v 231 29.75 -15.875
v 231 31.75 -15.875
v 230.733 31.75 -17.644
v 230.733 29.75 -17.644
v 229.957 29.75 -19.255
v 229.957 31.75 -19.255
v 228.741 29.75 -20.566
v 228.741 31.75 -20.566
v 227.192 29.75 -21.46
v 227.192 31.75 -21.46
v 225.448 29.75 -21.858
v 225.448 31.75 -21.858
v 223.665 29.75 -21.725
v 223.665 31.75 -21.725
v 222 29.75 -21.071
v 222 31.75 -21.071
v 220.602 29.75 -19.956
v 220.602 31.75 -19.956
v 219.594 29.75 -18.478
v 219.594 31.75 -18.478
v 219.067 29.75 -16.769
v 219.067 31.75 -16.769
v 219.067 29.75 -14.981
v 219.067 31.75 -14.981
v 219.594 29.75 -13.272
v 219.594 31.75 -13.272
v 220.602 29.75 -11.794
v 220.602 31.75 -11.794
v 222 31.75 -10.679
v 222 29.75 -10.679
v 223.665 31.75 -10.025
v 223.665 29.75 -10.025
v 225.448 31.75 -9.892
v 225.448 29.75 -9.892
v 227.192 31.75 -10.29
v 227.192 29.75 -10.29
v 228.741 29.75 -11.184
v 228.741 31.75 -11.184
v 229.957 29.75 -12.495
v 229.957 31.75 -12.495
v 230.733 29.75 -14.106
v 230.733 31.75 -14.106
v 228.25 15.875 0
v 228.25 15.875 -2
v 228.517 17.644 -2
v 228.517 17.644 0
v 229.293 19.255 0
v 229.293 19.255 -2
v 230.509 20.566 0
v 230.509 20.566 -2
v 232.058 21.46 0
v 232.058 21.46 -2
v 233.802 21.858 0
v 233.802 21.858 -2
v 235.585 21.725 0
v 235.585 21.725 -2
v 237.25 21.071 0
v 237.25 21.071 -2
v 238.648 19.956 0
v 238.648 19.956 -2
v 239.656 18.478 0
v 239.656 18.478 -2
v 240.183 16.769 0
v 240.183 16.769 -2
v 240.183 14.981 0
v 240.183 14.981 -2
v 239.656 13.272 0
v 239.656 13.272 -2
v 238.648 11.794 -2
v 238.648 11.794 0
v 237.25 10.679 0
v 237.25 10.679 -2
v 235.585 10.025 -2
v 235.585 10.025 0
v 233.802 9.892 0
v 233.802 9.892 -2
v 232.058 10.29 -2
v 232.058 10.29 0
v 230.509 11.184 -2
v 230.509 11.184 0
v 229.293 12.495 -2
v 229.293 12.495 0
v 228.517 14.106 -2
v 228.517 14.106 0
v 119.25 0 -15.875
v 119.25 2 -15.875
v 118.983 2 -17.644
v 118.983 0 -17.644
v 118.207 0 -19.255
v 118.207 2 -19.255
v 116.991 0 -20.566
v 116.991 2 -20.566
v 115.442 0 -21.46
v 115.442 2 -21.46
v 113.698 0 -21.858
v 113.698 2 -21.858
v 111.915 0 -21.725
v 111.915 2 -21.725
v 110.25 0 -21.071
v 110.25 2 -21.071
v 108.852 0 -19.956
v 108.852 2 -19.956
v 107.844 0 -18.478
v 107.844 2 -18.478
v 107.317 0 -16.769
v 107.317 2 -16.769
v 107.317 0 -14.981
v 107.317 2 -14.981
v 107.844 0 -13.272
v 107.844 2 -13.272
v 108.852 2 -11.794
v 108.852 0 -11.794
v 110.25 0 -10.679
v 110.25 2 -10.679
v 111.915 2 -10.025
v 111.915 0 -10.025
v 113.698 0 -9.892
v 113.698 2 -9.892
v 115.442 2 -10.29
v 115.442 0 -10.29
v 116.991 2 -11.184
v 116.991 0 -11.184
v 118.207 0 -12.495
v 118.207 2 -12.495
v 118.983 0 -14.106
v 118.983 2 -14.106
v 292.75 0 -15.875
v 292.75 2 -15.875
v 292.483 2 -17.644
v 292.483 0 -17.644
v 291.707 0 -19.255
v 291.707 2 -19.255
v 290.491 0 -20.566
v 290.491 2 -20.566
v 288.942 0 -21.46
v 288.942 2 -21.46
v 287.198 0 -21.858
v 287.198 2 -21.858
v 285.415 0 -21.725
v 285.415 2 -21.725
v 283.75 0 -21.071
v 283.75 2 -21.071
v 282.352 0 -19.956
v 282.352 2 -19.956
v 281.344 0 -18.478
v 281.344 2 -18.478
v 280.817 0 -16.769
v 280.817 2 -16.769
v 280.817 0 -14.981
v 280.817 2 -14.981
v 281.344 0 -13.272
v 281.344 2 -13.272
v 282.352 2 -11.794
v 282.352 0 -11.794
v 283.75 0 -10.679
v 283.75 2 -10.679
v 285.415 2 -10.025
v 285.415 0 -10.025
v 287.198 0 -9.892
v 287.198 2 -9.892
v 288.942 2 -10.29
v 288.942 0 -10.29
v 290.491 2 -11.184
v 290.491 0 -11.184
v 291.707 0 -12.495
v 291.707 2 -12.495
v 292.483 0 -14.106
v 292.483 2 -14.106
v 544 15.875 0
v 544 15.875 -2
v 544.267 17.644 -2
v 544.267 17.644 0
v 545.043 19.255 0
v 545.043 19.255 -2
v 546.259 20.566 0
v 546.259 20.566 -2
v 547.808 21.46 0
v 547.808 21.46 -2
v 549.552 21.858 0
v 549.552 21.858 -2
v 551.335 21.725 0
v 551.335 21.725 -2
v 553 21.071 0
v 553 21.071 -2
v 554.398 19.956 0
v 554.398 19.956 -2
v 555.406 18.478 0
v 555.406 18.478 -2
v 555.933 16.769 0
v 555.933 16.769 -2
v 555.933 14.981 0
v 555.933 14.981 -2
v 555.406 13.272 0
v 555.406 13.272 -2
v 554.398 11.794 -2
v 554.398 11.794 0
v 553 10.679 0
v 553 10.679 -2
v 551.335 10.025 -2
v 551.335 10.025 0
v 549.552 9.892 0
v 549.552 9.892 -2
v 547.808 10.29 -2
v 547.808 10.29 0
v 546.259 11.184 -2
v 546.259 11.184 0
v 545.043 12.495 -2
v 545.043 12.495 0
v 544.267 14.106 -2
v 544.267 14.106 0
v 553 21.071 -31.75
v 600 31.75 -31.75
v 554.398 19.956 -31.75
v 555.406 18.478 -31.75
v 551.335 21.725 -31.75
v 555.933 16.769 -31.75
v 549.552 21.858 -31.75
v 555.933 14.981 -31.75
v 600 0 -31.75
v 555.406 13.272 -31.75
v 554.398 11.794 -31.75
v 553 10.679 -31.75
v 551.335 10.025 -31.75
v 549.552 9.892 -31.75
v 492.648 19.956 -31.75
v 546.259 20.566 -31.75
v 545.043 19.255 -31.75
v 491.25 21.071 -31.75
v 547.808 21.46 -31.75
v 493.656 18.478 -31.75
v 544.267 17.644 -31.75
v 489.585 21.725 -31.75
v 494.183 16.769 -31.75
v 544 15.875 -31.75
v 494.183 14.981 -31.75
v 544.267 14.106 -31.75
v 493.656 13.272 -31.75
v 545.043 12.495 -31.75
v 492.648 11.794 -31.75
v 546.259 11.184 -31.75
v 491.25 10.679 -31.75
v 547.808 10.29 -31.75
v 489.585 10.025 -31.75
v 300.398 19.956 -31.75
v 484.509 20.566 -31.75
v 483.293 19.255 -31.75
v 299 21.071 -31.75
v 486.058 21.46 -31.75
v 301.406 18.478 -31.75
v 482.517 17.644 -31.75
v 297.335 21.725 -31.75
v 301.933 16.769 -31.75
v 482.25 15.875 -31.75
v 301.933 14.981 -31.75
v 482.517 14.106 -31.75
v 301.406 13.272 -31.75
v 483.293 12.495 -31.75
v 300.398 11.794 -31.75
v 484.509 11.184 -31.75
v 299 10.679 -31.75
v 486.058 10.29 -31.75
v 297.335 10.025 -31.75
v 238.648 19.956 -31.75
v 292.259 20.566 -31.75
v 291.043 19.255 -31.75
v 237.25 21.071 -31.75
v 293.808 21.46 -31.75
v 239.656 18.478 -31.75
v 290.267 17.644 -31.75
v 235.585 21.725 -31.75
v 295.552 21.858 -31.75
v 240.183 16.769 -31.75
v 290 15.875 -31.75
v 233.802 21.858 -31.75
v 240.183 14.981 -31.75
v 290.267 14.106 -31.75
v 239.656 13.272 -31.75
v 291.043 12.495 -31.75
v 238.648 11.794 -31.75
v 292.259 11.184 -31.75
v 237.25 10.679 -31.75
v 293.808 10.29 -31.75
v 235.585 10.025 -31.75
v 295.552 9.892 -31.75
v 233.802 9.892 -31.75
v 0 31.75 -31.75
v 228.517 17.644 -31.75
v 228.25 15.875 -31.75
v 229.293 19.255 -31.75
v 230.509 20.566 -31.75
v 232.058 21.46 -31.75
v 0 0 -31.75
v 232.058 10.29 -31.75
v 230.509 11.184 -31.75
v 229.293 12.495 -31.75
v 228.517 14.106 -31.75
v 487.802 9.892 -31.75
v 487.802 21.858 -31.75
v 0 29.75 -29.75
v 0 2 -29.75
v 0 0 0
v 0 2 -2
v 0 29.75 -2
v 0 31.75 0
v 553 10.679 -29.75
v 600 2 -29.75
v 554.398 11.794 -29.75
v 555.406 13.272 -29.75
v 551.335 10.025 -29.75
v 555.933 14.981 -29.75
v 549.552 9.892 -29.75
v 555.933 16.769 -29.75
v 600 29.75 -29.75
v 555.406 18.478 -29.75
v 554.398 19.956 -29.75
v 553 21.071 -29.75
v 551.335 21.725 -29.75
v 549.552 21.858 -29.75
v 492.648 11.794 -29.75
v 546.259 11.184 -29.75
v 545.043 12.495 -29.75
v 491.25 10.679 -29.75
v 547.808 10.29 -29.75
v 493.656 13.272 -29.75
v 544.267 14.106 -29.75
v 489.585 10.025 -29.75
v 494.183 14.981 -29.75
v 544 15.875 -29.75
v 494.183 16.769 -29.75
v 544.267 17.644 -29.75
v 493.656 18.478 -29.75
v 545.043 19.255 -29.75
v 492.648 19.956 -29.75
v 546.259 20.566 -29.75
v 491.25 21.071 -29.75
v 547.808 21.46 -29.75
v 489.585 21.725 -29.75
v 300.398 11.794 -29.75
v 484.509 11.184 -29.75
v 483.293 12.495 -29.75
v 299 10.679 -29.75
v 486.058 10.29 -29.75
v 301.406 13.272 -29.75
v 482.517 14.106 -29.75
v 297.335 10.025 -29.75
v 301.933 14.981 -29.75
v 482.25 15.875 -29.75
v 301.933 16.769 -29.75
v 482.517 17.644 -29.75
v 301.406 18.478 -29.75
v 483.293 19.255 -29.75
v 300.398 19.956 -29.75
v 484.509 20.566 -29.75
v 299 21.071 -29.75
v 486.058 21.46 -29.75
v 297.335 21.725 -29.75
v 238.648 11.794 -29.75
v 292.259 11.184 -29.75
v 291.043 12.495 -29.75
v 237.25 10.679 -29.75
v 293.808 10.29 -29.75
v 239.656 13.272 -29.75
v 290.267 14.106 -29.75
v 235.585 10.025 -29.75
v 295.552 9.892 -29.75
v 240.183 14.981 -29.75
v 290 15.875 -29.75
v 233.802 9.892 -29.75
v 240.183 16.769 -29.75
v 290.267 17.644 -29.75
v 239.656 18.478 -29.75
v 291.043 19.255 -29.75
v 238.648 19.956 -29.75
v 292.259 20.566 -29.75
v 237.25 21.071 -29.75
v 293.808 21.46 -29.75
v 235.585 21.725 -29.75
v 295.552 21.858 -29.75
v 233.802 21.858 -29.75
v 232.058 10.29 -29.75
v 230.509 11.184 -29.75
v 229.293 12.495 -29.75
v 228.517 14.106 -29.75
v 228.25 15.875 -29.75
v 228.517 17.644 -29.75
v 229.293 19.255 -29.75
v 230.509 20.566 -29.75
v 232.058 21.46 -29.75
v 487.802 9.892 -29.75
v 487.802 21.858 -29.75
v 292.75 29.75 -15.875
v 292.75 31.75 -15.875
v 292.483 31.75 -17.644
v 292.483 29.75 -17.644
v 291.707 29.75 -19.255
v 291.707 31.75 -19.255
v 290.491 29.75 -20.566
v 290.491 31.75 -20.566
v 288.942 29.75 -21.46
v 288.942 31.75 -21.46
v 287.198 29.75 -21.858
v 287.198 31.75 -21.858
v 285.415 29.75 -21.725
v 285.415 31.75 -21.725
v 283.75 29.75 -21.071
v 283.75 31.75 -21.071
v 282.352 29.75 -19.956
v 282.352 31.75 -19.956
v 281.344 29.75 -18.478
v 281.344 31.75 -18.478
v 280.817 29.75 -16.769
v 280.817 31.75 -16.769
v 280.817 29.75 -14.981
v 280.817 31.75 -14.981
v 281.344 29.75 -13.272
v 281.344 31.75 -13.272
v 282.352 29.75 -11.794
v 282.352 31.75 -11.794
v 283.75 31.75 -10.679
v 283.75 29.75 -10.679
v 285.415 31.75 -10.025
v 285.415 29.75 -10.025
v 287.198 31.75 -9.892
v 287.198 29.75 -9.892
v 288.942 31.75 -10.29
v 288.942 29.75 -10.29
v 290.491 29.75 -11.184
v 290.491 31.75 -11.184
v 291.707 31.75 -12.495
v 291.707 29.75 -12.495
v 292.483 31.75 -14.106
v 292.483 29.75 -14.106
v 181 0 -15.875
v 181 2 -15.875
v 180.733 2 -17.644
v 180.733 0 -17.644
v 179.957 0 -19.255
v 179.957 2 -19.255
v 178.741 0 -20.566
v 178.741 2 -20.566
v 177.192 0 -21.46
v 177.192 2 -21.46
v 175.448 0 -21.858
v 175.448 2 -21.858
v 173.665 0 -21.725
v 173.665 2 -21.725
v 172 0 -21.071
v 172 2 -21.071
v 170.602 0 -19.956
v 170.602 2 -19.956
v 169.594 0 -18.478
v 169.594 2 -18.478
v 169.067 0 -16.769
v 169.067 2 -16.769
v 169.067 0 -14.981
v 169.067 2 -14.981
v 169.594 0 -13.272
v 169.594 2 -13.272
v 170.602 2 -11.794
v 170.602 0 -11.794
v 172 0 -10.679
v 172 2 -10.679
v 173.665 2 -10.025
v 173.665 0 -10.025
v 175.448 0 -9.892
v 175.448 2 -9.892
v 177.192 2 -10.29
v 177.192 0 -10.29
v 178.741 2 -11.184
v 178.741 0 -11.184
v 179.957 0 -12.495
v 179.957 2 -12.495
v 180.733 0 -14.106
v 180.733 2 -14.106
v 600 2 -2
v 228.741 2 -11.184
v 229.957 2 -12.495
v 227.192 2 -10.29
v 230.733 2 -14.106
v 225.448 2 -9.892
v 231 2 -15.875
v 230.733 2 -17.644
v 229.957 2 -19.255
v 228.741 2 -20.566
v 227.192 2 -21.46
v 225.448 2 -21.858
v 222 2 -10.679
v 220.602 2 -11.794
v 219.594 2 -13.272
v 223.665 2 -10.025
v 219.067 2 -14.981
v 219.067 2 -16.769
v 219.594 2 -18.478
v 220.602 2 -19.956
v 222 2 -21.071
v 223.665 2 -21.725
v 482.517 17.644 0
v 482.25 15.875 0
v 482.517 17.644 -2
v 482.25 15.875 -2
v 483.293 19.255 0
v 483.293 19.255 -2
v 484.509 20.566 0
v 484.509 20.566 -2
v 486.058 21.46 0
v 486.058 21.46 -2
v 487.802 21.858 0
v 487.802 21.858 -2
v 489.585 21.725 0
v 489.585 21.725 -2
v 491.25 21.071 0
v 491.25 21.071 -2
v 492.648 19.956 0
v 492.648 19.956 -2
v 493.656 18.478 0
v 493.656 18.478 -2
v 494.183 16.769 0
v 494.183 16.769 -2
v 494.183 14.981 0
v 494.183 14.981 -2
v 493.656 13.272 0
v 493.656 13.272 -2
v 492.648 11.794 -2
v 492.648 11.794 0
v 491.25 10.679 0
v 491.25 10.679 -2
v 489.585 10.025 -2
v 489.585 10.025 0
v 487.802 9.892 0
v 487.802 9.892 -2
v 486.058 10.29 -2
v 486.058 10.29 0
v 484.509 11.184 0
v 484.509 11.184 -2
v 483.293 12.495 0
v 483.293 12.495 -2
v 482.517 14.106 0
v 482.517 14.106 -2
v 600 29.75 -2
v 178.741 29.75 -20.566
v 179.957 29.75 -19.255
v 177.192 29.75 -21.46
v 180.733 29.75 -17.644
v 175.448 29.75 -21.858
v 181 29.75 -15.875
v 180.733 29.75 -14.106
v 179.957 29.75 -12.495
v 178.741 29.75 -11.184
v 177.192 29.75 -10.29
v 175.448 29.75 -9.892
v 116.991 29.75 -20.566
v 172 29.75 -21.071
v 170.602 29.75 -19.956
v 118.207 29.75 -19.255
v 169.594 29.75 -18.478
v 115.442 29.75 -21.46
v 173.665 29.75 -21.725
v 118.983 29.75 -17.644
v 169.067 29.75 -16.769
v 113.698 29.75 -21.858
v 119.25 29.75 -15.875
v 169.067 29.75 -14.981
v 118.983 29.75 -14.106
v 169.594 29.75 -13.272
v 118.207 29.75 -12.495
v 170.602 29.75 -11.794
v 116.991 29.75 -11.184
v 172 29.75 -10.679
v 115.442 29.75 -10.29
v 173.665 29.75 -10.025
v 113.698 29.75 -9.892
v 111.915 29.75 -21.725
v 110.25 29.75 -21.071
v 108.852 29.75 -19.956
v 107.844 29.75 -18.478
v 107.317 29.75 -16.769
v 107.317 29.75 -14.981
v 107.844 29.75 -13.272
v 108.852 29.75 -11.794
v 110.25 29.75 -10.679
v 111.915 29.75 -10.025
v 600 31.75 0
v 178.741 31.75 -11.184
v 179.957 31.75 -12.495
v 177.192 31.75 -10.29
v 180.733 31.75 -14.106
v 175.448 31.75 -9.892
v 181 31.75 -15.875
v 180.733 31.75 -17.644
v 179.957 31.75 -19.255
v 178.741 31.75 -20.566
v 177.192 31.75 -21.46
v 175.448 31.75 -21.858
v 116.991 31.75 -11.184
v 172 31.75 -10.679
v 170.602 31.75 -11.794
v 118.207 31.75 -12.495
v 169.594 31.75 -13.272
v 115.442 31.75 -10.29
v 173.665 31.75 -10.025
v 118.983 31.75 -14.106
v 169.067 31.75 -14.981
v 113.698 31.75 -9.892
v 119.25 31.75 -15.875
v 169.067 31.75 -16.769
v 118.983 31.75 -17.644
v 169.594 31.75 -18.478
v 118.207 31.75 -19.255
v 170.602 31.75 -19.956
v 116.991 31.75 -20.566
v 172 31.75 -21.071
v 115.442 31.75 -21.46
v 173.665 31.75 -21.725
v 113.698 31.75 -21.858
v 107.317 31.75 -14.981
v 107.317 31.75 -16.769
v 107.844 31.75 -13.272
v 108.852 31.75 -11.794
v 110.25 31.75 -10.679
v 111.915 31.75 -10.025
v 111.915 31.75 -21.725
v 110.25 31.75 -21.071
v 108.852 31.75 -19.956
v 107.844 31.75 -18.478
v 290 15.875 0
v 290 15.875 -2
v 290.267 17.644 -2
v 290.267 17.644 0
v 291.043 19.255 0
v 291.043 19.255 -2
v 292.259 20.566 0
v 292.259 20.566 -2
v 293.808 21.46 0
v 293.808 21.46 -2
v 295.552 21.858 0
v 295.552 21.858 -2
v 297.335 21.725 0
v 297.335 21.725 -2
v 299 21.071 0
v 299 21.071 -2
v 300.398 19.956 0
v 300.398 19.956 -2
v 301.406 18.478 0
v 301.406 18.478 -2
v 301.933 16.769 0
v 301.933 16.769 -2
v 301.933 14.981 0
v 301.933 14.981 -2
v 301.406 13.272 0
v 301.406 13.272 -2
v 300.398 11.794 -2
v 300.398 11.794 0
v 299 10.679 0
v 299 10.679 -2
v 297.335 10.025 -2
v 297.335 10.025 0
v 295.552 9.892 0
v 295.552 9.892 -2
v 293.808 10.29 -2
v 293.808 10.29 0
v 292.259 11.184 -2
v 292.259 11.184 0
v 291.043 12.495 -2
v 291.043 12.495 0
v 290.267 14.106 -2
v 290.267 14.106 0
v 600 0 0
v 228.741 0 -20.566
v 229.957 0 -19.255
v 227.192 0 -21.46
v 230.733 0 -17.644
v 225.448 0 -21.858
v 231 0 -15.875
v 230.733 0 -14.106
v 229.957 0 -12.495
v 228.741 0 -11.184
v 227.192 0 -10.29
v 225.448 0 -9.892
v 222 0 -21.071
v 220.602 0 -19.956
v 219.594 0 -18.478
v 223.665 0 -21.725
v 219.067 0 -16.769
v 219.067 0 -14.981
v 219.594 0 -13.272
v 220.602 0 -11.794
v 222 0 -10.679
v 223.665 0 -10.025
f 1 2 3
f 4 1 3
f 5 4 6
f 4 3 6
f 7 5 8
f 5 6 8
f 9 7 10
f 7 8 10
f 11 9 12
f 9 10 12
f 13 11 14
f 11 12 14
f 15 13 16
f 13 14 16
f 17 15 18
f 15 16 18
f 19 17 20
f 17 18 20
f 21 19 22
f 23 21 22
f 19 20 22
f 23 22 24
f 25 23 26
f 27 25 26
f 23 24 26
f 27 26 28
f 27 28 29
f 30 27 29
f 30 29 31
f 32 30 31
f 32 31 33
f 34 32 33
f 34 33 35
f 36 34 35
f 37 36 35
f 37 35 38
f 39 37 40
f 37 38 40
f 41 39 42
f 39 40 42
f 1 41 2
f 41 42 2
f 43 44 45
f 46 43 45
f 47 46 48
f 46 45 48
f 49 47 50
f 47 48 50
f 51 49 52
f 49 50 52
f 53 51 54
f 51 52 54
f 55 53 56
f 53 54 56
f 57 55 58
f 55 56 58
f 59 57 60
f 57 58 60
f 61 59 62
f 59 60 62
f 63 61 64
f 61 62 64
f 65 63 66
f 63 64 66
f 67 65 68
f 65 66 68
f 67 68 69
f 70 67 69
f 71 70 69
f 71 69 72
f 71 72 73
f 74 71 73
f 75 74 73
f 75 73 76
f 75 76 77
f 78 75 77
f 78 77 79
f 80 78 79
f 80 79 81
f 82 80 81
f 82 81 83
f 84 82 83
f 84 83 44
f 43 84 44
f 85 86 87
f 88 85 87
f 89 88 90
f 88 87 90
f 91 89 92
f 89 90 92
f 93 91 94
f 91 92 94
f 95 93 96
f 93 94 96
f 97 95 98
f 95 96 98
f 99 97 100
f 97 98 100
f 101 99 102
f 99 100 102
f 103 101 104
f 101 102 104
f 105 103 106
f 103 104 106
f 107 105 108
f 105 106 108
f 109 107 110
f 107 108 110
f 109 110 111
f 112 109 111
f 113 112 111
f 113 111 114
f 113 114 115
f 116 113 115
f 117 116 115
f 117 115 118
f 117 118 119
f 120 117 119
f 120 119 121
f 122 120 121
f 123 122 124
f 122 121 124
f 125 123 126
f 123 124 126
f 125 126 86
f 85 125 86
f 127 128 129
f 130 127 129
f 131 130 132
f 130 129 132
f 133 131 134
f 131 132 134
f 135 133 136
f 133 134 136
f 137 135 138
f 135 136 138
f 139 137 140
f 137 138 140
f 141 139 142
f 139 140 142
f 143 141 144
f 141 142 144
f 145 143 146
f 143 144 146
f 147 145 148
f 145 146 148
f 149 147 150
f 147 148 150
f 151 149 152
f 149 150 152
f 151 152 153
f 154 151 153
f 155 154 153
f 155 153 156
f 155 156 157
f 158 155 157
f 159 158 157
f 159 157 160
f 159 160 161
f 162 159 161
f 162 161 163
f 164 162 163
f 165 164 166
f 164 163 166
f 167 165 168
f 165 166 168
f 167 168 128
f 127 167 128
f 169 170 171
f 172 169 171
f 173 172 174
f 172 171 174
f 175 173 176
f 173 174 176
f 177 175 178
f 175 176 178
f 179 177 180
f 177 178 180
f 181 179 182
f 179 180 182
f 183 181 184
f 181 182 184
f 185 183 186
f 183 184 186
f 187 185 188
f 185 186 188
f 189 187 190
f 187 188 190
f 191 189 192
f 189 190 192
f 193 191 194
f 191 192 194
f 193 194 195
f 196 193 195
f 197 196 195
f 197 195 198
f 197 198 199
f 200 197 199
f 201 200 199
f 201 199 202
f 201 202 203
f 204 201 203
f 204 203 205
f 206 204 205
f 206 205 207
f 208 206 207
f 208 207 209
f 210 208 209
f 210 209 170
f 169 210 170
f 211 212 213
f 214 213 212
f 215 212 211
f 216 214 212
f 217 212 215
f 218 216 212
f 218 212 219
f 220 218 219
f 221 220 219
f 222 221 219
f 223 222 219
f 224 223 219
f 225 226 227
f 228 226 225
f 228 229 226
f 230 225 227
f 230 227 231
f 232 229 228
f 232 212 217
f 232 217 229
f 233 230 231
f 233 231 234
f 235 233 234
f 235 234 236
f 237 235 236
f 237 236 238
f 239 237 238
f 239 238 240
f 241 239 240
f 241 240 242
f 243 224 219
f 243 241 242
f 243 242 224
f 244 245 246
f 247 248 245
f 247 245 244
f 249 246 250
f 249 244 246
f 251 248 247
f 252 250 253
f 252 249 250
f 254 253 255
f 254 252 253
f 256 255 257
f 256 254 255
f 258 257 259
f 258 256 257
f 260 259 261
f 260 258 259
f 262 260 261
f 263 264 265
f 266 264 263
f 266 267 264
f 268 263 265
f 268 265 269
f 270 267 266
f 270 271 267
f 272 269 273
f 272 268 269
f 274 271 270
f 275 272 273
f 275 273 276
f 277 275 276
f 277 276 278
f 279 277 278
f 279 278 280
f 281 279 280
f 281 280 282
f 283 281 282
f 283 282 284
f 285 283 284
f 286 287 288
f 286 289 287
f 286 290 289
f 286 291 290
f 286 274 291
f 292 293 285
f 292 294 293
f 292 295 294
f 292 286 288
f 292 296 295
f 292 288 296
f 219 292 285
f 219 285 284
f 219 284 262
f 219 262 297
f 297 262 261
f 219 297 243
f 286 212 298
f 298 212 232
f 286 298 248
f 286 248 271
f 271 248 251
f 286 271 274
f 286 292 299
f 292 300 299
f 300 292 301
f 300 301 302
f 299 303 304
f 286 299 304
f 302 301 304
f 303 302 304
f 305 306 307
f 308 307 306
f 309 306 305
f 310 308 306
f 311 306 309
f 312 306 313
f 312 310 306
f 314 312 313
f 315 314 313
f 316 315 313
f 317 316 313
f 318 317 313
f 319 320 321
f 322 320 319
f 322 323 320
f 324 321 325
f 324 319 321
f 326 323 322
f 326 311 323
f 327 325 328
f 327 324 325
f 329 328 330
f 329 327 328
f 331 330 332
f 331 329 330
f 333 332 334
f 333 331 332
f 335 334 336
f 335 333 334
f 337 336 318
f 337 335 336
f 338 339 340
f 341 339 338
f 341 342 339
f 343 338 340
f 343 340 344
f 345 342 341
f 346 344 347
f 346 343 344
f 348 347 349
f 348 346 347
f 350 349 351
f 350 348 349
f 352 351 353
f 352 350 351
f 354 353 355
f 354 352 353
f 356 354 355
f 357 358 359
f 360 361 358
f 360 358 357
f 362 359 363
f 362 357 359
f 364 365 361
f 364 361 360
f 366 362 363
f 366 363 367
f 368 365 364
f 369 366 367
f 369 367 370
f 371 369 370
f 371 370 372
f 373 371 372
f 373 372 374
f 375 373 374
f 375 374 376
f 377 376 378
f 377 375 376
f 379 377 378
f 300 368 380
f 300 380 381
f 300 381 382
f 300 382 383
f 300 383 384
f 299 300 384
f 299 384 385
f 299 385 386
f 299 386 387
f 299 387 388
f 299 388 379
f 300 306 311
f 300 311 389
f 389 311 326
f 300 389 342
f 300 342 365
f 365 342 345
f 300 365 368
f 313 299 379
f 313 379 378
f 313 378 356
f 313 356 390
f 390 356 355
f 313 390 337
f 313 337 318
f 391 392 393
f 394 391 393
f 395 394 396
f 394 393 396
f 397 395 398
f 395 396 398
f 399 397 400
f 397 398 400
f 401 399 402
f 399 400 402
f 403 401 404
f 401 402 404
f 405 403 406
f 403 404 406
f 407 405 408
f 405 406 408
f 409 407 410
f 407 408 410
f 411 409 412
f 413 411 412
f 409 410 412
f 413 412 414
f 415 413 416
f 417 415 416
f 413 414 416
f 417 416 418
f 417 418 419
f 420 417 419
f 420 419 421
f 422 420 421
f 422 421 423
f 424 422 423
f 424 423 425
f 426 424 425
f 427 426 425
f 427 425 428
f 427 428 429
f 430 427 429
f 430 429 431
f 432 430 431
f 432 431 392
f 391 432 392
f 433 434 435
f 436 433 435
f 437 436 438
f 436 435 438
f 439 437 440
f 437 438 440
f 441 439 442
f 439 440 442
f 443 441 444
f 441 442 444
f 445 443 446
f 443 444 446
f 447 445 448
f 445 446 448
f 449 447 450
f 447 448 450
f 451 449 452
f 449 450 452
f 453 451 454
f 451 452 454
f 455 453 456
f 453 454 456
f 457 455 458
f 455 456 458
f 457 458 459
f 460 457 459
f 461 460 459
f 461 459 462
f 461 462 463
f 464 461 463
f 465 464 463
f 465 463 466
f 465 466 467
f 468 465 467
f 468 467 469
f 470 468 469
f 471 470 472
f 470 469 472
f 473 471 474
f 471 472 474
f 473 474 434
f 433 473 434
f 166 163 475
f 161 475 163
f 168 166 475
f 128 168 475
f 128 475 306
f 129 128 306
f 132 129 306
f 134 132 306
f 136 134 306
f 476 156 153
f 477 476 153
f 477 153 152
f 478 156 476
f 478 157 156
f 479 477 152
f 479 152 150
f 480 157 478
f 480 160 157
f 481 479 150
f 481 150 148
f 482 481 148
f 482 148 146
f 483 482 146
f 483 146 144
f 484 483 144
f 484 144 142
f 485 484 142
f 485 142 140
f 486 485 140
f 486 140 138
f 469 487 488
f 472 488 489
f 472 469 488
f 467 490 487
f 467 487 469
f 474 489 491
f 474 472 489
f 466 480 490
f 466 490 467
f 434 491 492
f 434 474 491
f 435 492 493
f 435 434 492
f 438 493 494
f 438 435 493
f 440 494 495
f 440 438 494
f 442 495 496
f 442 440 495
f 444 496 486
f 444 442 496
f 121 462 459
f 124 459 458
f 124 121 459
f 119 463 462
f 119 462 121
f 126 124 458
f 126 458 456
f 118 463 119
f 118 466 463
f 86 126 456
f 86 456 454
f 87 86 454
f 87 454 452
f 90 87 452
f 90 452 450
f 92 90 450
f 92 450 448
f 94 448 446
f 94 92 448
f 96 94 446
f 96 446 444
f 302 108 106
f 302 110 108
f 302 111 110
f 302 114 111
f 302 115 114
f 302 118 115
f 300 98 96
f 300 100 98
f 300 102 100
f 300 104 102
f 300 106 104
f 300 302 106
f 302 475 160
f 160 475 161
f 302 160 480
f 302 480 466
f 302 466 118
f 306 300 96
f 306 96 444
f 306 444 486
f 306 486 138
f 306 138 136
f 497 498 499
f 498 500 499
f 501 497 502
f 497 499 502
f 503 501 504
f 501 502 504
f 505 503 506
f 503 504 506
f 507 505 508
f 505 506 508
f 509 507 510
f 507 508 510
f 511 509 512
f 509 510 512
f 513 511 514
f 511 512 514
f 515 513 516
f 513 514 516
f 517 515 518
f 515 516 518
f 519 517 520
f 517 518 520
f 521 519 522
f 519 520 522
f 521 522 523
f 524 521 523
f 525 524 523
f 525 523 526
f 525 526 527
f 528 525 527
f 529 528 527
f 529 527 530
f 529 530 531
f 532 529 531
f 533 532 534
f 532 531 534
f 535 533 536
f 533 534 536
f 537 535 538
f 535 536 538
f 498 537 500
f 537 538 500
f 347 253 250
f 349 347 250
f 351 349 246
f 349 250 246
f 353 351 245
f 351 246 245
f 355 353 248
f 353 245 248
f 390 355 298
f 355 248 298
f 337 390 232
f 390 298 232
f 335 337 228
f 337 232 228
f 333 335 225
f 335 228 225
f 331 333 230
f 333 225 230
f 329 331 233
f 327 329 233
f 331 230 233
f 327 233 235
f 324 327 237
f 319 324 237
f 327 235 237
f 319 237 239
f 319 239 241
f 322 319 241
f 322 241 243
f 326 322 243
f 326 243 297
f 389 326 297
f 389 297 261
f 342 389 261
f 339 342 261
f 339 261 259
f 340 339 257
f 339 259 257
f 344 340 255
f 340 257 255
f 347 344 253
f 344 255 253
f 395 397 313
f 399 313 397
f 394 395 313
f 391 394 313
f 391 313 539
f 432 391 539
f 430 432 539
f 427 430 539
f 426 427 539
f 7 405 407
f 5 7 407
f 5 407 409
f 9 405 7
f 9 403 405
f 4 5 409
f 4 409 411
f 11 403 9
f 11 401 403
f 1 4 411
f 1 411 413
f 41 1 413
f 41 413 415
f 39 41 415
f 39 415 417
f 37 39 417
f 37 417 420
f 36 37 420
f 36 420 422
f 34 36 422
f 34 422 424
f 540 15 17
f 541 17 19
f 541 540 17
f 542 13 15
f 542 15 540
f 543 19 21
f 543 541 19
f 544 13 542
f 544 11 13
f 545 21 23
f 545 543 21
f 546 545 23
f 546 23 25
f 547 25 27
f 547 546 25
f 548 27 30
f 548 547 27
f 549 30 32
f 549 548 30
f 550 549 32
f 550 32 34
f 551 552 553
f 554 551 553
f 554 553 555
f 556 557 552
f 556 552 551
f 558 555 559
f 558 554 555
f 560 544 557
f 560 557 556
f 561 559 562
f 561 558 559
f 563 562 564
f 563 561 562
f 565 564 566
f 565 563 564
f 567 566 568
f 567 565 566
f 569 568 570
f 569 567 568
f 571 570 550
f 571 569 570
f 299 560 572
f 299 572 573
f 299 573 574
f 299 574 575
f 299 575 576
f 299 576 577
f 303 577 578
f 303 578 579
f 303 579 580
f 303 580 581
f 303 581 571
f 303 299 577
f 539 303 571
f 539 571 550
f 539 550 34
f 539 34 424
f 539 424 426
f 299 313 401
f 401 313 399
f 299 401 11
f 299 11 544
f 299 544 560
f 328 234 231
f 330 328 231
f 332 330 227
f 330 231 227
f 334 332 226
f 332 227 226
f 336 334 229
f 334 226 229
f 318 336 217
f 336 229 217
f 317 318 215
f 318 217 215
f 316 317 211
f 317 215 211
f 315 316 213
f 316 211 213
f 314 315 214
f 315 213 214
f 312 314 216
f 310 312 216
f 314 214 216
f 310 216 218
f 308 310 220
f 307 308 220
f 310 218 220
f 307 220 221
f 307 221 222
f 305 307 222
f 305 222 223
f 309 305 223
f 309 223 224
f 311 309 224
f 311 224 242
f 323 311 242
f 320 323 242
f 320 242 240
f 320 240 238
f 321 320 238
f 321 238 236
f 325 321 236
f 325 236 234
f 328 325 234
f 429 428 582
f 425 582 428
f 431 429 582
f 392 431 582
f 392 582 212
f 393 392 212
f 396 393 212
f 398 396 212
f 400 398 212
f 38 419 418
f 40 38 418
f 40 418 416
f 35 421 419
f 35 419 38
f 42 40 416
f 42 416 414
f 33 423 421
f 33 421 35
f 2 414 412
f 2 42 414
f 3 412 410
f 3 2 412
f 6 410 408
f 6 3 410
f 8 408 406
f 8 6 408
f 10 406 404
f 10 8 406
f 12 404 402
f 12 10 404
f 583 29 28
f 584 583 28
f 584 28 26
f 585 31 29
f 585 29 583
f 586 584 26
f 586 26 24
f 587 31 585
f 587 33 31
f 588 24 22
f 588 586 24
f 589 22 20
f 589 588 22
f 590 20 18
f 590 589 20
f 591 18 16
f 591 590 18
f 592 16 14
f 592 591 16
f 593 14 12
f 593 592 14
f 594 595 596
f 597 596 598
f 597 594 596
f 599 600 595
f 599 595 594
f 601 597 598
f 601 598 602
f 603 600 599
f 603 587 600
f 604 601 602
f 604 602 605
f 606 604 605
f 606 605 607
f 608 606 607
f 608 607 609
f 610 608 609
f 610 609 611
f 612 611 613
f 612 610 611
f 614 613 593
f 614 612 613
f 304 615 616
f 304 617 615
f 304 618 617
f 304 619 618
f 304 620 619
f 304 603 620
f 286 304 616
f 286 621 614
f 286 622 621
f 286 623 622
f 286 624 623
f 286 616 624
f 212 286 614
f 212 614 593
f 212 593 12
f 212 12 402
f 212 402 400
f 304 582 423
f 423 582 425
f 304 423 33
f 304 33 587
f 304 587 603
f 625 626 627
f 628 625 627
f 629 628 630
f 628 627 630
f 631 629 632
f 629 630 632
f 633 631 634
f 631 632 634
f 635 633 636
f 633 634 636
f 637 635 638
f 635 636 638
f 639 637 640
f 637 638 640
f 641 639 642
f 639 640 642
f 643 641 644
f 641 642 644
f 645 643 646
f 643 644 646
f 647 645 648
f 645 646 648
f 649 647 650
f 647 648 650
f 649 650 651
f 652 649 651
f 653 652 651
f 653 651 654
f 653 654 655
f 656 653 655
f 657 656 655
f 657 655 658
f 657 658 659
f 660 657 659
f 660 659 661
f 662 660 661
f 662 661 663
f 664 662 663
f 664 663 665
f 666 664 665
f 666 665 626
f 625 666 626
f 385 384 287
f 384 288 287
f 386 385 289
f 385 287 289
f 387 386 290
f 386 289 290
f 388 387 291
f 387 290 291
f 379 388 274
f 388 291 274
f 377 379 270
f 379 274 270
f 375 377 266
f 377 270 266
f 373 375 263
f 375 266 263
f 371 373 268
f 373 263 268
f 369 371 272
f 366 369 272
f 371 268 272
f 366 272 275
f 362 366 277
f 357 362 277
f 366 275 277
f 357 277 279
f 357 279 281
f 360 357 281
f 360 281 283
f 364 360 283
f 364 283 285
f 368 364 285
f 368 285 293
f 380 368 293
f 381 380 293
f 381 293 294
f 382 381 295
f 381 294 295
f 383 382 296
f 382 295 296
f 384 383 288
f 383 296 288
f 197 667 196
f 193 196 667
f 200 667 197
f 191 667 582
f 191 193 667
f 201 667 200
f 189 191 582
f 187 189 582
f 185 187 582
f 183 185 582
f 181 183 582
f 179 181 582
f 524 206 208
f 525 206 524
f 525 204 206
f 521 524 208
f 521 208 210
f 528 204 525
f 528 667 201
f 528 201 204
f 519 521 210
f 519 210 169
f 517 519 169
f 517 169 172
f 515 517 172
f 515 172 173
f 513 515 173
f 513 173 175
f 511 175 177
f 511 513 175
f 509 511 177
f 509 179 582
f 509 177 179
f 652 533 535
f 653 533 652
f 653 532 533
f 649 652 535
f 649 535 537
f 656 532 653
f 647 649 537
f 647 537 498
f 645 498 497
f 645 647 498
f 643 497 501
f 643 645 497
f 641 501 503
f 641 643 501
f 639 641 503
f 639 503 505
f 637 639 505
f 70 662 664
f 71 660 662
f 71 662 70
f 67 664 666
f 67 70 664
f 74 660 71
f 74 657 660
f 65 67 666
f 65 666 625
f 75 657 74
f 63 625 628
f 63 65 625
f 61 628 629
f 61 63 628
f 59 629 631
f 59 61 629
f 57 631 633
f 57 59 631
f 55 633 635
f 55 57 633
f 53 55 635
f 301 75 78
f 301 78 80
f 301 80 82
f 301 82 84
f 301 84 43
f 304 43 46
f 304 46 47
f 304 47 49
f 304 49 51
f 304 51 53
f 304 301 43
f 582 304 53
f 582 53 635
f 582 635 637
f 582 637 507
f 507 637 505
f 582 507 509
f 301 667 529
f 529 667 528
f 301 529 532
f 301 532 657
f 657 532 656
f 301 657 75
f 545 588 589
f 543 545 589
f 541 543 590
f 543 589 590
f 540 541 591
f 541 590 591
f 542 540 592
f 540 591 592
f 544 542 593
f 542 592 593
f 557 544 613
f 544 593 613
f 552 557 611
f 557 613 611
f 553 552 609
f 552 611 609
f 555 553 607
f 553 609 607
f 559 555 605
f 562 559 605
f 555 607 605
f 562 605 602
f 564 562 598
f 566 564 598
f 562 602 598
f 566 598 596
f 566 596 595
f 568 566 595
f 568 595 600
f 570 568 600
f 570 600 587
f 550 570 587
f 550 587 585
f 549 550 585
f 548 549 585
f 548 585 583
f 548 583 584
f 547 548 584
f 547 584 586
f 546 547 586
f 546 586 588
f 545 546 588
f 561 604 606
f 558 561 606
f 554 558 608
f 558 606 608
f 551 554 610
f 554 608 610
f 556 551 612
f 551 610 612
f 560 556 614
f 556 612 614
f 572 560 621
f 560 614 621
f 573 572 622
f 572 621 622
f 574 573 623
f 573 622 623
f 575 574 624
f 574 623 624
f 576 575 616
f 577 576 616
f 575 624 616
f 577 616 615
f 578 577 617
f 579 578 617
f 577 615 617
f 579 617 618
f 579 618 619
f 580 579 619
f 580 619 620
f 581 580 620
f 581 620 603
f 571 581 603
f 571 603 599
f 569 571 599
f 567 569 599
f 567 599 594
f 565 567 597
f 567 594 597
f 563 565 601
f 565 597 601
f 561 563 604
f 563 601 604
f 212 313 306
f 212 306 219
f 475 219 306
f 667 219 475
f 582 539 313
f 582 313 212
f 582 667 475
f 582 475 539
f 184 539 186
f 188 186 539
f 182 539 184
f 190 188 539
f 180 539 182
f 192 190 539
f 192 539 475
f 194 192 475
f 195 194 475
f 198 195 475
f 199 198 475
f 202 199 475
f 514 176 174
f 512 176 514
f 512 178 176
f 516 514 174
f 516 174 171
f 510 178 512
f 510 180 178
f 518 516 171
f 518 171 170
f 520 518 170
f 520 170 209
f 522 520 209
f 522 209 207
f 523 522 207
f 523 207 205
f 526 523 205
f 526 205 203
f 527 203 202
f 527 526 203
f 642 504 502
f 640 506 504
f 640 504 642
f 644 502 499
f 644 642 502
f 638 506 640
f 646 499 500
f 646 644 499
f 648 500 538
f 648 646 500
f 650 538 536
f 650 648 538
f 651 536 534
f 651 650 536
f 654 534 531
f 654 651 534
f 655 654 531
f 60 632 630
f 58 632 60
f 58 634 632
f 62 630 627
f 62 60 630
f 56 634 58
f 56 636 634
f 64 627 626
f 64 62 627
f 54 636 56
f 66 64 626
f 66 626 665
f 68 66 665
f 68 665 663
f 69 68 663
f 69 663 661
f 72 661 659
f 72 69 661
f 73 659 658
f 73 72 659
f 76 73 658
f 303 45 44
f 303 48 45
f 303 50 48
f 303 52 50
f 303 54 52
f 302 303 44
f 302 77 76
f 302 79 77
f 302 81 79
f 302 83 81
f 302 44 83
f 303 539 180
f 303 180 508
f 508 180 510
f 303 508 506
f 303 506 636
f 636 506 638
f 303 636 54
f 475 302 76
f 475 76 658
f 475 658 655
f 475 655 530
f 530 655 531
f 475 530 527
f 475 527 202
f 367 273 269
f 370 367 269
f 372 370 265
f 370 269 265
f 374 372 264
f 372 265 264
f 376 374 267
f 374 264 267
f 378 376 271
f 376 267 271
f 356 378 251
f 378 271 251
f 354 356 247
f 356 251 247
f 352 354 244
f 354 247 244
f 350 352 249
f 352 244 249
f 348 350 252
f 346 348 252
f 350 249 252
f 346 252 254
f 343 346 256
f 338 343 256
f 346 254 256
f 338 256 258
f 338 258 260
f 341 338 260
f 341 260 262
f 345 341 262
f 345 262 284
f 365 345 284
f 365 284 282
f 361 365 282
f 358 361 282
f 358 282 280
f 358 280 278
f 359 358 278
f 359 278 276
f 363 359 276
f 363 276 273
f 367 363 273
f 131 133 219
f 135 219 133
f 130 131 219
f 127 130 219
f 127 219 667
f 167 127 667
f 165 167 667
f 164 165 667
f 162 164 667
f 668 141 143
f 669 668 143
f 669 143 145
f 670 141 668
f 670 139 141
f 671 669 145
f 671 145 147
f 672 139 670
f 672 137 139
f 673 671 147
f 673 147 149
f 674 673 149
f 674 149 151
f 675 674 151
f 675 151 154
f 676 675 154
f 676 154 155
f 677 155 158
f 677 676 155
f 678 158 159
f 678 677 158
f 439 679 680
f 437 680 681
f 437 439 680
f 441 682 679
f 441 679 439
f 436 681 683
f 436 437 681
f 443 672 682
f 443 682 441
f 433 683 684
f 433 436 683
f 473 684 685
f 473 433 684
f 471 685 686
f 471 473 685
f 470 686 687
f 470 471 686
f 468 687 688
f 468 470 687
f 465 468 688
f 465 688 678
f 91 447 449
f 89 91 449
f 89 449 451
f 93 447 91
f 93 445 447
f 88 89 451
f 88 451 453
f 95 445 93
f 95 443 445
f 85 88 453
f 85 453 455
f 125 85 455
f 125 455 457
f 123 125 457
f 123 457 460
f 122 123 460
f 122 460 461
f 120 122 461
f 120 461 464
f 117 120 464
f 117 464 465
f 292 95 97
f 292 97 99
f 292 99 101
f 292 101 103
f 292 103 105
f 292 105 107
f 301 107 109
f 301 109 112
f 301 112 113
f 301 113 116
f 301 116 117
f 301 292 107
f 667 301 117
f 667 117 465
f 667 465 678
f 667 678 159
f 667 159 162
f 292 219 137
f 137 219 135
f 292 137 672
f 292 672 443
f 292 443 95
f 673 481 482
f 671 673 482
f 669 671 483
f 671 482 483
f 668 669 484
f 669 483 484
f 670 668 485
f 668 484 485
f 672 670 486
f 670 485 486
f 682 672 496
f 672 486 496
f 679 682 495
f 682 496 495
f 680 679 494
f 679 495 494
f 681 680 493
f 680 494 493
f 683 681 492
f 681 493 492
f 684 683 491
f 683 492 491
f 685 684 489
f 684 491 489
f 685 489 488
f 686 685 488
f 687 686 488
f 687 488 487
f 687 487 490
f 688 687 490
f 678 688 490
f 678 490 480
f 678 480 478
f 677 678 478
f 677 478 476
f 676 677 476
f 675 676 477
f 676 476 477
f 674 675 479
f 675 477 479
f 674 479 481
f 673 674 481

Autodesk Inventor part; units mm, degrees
ref_plane "YZ Plane" through (0, 0, 0) normal (1, 0, 0) x (0, 1, 0)
ref_plane "XZ Plane" through (0, 0, 0) normal (0, 1, 0) x (-1, 0, 0)
ref_plane "XY Plane" through (0, 0, 0) normal (0, 0, 1) x (1, 0, 0)
sketch "Sketch1" plane through (0, 0, 0) normal (1, 0, 0) x (0, 1, 0)
  line L0 (0, 0) -> (31.75, 0)
  line L1 (31.75, 0) -> (31.75, -31.75)
  line L2 (31.75, -31.75) -> (0, -31.75)
  line L3 (0, -31.75) -> (0, 0)
  line L4 (29.75, -29.75) -> (29.75, -2)
  line L5 (29.75, -2) -> (2, -2)
  line L6 (2, -2) -> (2, -29.75)
  line L7 (2, -29.75) -> (29.75, -29.75)
  dimension "d0" = 31.75
  dimension "d1" = 31.75
  dimension "d2" = 2
extrude "Extrusion1" add sketch "Sketch1" along normal blind 600
sketch "Sketch2" plane through (0, 31.75, 0) normal (0, 1, 0) x (1, 0, 0)
  line L0 (0, 0) -> (600, 0) projected
  line L1 (600, 0) -> (400, 0)
  line L2 (0, 0) -> (400, 0)
  line L3 (0, 0) -> (400, 0)
  line L4 (0, 0) -> (200, 0)
  line L5 (0, 31.75) -> (0, 0) projected
  line L6 (0, 0) -> (600, 0) projected
  line L7 (600, 31.75) -> (600, 0) projected
  line L8 (0, 31.75) -> (600, 31.75) projected
  circle A0 centre (286.75, 15.875) radius 6
  circle A1 centre (113.25, 15.875) radius 6
  circle A2 centre (175, 15.875) radius 6
  circle A3 centre (225, 15.875) radius 6
  dimension "d5" = 200
  dimension "d6" = 200
  dimension "d7" = 12
  dimension "d8" = 86.75
  dimension "d9" = 12
  dimension "d10" = 86.75
  dimension "d11" = 12
  dimension "d12" = 61.75
  dimension "d13" = 12
  dimension "d14" = 61.75
extrude "Extrusion2" cut sketch "Sketch2" against normal through all contours A0 | A1 | A2 | A3
sketch "Sketch3" plane through (0, 0, -31.75) normal (0, 0, -1) x (-1, 0, 0)
  line L0 (-600, 0) -> (-550, 0)
  line L1 (0, 0) -> (-600, 0) projected
  line L2 (0, 0) -> (0, 31.75) projected
  line L3 (0, 31.75) -> (-600, 31.75) projected
  line L4 (-600, 0) -> (-600, 31.75) projected
  line L5 (0, 0) -> (-600, 0) projected
  circle A0 centre (-550, 15.875) radius 6
  circle A1 centre (-488.25, 15.875) radius 6
  dimension "d17" = 50
  dimension "d19" = 12
  dimension "d20" = 12
  dimension "d21" = 61.75
extrude "Extrusion3" cut sketch "Sketch3" against normal through all contours A0 | A1
sketch "Sketch4" plane through (0, 0, -31.75) normal (0, 0, -1) x (-1, 0, 0)
  circle A0 centre (-296, 15.875) radius 6
  circle A1 centre (-488.25, 15.875) radius 6 projected
  circle A2 centre (-234.25, 15.875) radius 6
  point P0 (0, 0)
  dimension "d24" = 12
  dimension "d25" = 180.25
  dimension "d28" = 12
  dimension "d29" = 61.75
extrude "Extrusion4" cut sketch "Sketch4" against normal through all contours A0 | A2
properties part number "Base_Fija_Acero"
